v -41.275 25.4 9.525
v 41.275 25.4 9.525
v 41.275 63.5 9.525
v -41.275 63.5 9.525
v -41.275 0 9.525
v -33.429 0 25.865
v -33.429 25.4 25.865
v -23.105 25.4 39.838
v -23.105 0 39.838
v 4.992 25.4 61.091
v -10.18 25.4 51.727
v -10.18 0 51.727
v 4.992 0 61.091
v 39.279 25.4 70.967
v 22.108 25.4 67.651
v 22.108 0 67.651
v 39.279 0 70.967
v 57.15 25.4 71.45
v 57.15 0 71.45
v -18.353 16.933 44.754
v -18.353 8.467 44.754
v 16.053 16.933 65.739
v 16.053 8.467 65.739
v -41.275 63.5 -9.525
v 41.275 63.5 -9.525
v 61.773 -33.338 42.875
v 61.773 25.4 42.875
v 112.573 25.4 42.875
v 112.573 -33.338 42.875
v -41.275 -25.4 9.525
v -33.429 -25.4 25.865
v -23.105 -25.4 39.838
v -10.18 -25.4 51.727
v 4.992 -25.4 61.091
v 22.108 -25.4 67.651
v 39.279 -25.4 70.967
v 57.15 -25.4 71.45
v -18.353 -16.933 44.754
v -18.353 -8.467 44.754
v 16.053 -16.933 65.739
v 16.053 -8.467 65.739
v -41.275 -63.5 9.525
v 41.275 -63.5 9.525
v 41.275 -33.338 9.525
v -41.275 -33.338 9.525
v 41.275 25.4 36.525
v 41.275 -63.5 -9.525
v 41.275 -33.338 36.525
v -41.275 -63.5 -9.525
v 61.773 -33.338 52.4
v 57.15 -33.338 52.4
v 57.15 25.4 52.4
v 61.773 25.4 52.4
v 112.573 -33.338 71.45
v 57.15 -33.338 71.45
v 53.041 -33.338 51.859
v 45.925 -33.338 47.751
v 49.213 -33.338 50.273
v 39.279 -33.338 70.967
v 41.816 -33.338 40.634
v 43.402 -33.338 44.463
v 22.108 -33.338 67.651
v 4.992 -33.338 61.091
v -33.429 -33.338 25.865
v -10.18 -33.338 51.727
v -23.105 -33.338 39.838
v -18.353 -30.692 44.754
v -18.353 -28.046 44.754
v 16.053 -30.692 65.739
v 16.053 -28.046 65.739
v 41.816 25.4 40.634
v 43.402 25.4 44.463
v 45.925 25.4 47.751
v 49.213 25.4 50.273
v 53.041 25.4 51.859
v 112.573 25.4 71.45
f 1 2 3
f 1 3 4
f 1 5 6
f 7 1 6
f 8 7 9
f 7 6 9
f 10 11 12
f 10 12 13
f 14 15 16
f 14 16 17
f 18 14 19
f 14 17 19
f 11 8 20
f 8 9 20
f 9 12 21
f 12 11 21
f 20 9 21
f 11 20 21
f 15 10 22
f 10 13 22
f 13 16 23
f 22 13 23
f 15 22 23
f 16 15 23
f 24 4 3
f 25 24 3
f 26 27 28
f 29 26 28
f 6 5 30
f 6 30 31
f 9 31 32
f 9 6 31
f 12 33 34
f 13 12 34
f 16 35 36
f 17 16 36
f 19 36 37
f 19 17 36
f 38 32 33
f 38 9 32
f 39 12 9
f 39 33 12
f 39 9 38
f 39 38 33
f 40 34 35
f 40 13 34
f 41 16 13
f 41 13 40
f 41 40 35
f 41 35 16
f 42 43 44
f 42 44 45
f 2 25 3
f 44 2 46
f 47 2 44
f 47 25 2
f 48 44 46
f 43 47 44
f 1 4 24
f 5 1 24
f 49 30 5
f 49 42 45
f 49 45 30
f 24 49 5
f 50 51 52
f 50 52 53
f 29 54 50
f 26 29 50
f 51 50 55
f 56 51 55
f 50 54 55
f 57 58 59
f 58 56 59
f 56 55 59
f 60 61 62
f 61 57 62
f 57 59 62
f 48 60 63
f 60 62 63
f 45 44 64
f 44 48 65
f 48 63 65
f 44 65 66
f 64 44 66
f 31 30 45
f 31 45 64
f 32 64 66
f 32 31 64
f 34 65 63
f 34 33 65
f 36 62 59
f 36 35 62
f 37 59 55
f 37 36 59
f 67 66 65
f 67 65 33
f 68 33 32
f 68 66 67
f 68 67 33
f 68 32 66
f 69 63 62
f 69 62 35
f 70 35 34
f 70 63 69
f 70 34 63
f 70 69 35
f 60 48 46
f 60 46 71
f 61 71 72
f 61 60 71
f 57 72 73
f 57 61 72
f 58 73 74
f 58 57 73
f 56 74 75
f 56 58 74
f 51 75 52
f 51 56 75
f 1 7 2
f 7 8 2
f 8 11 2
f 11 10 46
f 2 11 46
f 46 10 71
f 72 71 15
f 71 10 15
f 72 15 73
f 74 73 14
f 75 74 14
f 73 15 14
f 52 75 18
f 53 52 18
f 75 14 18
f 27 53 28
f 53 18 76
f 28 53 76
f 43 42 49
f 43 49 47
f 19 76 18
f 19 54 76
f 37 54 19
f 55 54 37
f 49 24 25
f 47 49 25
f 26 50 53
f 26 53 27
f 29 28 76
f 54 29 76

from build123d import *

# Parameters (mm, degrees)
F1_DEPTH = 63.5
F0_W     = 25.4
F0_H     = 28.575
F2_DEPTH = 25.4
F3_DEPTH = 7.9375


with BuildPart() as f1:
    # F0 (on Front) → F1 (new body, symmetric)
    with BuildSketch(Plane.XZ):
        Polygon((-41.275, 9.525), (-41.275, -9.525), (41.275, -9.525), (41.275, 9.525), (22.225, 9.525), align=None)
    extrude(amount=F1_DEPTH, both=True)

    # F0 (on Front) → F2 (join, symmetric)
    with BuildSketch(Plane.XZ):
        Polygon((-41.275, 9.525), (-41.275, -9.525), (41.275, -9.525), (41.275, 9.525), (22.225, 9.525), align=None)
        with BuildLine():
            add(Edge.make_bspline(
                [(-41.275, 9.525), (-25.692793, 51.531576), (14.306218, 73.720813), (57.15, 71.4502)],
                knots=[0, 0, 0, 0, 116.285042, 116.285042, 116.285042, 116.285042], degree=3))
            Line((-41.275, 9.525), (22.225, 9.525))
            Line((22.225, 9.525), (22.225, 36.5252))
            ThreePointArc((22.225, 36.5252), (32.454296, 61.220904), (57.15, 71.4502))
        make_face()
        with BuildLine():
            Line((22.225, 9.525), (41.275, 9.525))
            Line((41.275, 9.525), (41.275, 36.5252))
            ThreePointArc((41.275, 36.5252), (45.92468, 47.75052), (57.15, 52.4002))
            Line((57.15, 52.4002), (61.7728, 52.4002))
            Line((61.7728, 52.4002), (61.7728, 71.4502))
            Line((61.7728, 71.4502), (57.15, 71.4502))
            ThreePointArc((57.15, 71.4502), (32.454296, 61.220904), (22.225, 36.5252))
            Line((22.225, 36.5252), (22.225, 9.525))
        make_face()
        Polygon((85.725, 71.4502), (61.7728, 71.4502), (61.7728, 52.4002), (61.7728, 42.8752), (87.1728, 42.8752), (87.1728, 71.4502), align=None)
        with Locations((99.8728, 57.1627)):
            Rectangle(F0_W, F0_H)
    extrude(amount=F2_DEPTH, both=True)

    # F0 (on Front) + F2_face (on face) → F3 (join, symmetric)
    with BuildSketch(Plane.XZ):
        Polygon((-41.275, 9.525), (-41.275, -9.525), (41.275, -9.525), (41.275, 9.525), (22.225, 9.525), align=None)
        with BuildLine():
            add(Edge.make_bspline(
                [(-41.275, 9.525), (-25.692793, 51.531576), (14.306218, 73.720813), (57.15, 71.4502)],
                knots=[0, 0, 0, 0, 116.285042, 116.285042, 116.285042, 116.285042], degree=3))
            Line((-41.275, 9.525), (22.225, 9.525))
            Line((22.225, 9.525), (22.225, 36.5252))
            ThreePointArc((22.225, 36.5252), (32.454296, 61.220904), (57.15, 71.4502))
        make_face()
        with BuildLine():
            Line((22.225, 9.525), (41.275, 9.525))
            Line((41.275, 9.525), (41.275, 36.5252))
            ThreePointArc((41.275, 36.5252), (45.92468, 47.75052), (57.15, 52.4002))
            Line((57.15, 52.4002), (61.7728, 52.4002))
            Line((61.7728, 52.4002), (61.7728, 71.4502))
            Line((61.7728, 71.4502), (57.15, 71.4502))
            ThreePointArc((57.15, 71.4502), (32.454296, 61.220904), (22.225, 36.5252))
            Line((22.225, 36.5252), (22.225, 9.525))
        make_face()
        Polygon((85.725, 71.4502), (61.7728, 71.4502), (61.7728, 52.4002), (61.7728, 42.8752), (87.1728, 42.8752), (87.1728, 71.4502), align=None)
        with Locations((99.8728, 57.1627)):
            Rectangle(F0_W, F0_H)
    with BuildSketch(Plane(origin=(32.737108, -25.4, 42.563557), x_dir=(1, 0, 0), z_dir=(0, -1, 0))):
        with BuildLine():
            add(Edge.make_bspline(
                [(-74.012108, -33.038557), (-58.429901, 8.968018), (-18.43089, 31.157256), (24.412892, 28.886643)],
                knots=[0, 0, 0, 0, 116.285042, 116.285042, 116.285042, 116.285042], degree=3))
            Line((-74.012108, -33.038557), (8.537892, -33.038557))
            Line((8.537892, -33.038557), (8.537892, -6.038357))
            ThreePointArc((8.537892, -6.038357), (13.187572, 5.186963), (24.412892, 9.836643))
            Line((24.412892, 9.836643), (29.035692, 9.836643))
            Line((29.035692, 9.836643), (29.035692, 0.311643))
            Line((29.035692, 0.311643), (79.835692, 0.311643))
            Line((79.835692, 0.311643), (79.835692, 28.886643))
            Line((79.835692, 28.886643), (24.412892, 28.886643))
        make_face()
    extrude(amount=F3_DEPTH, both=True)


solid = f1.part
